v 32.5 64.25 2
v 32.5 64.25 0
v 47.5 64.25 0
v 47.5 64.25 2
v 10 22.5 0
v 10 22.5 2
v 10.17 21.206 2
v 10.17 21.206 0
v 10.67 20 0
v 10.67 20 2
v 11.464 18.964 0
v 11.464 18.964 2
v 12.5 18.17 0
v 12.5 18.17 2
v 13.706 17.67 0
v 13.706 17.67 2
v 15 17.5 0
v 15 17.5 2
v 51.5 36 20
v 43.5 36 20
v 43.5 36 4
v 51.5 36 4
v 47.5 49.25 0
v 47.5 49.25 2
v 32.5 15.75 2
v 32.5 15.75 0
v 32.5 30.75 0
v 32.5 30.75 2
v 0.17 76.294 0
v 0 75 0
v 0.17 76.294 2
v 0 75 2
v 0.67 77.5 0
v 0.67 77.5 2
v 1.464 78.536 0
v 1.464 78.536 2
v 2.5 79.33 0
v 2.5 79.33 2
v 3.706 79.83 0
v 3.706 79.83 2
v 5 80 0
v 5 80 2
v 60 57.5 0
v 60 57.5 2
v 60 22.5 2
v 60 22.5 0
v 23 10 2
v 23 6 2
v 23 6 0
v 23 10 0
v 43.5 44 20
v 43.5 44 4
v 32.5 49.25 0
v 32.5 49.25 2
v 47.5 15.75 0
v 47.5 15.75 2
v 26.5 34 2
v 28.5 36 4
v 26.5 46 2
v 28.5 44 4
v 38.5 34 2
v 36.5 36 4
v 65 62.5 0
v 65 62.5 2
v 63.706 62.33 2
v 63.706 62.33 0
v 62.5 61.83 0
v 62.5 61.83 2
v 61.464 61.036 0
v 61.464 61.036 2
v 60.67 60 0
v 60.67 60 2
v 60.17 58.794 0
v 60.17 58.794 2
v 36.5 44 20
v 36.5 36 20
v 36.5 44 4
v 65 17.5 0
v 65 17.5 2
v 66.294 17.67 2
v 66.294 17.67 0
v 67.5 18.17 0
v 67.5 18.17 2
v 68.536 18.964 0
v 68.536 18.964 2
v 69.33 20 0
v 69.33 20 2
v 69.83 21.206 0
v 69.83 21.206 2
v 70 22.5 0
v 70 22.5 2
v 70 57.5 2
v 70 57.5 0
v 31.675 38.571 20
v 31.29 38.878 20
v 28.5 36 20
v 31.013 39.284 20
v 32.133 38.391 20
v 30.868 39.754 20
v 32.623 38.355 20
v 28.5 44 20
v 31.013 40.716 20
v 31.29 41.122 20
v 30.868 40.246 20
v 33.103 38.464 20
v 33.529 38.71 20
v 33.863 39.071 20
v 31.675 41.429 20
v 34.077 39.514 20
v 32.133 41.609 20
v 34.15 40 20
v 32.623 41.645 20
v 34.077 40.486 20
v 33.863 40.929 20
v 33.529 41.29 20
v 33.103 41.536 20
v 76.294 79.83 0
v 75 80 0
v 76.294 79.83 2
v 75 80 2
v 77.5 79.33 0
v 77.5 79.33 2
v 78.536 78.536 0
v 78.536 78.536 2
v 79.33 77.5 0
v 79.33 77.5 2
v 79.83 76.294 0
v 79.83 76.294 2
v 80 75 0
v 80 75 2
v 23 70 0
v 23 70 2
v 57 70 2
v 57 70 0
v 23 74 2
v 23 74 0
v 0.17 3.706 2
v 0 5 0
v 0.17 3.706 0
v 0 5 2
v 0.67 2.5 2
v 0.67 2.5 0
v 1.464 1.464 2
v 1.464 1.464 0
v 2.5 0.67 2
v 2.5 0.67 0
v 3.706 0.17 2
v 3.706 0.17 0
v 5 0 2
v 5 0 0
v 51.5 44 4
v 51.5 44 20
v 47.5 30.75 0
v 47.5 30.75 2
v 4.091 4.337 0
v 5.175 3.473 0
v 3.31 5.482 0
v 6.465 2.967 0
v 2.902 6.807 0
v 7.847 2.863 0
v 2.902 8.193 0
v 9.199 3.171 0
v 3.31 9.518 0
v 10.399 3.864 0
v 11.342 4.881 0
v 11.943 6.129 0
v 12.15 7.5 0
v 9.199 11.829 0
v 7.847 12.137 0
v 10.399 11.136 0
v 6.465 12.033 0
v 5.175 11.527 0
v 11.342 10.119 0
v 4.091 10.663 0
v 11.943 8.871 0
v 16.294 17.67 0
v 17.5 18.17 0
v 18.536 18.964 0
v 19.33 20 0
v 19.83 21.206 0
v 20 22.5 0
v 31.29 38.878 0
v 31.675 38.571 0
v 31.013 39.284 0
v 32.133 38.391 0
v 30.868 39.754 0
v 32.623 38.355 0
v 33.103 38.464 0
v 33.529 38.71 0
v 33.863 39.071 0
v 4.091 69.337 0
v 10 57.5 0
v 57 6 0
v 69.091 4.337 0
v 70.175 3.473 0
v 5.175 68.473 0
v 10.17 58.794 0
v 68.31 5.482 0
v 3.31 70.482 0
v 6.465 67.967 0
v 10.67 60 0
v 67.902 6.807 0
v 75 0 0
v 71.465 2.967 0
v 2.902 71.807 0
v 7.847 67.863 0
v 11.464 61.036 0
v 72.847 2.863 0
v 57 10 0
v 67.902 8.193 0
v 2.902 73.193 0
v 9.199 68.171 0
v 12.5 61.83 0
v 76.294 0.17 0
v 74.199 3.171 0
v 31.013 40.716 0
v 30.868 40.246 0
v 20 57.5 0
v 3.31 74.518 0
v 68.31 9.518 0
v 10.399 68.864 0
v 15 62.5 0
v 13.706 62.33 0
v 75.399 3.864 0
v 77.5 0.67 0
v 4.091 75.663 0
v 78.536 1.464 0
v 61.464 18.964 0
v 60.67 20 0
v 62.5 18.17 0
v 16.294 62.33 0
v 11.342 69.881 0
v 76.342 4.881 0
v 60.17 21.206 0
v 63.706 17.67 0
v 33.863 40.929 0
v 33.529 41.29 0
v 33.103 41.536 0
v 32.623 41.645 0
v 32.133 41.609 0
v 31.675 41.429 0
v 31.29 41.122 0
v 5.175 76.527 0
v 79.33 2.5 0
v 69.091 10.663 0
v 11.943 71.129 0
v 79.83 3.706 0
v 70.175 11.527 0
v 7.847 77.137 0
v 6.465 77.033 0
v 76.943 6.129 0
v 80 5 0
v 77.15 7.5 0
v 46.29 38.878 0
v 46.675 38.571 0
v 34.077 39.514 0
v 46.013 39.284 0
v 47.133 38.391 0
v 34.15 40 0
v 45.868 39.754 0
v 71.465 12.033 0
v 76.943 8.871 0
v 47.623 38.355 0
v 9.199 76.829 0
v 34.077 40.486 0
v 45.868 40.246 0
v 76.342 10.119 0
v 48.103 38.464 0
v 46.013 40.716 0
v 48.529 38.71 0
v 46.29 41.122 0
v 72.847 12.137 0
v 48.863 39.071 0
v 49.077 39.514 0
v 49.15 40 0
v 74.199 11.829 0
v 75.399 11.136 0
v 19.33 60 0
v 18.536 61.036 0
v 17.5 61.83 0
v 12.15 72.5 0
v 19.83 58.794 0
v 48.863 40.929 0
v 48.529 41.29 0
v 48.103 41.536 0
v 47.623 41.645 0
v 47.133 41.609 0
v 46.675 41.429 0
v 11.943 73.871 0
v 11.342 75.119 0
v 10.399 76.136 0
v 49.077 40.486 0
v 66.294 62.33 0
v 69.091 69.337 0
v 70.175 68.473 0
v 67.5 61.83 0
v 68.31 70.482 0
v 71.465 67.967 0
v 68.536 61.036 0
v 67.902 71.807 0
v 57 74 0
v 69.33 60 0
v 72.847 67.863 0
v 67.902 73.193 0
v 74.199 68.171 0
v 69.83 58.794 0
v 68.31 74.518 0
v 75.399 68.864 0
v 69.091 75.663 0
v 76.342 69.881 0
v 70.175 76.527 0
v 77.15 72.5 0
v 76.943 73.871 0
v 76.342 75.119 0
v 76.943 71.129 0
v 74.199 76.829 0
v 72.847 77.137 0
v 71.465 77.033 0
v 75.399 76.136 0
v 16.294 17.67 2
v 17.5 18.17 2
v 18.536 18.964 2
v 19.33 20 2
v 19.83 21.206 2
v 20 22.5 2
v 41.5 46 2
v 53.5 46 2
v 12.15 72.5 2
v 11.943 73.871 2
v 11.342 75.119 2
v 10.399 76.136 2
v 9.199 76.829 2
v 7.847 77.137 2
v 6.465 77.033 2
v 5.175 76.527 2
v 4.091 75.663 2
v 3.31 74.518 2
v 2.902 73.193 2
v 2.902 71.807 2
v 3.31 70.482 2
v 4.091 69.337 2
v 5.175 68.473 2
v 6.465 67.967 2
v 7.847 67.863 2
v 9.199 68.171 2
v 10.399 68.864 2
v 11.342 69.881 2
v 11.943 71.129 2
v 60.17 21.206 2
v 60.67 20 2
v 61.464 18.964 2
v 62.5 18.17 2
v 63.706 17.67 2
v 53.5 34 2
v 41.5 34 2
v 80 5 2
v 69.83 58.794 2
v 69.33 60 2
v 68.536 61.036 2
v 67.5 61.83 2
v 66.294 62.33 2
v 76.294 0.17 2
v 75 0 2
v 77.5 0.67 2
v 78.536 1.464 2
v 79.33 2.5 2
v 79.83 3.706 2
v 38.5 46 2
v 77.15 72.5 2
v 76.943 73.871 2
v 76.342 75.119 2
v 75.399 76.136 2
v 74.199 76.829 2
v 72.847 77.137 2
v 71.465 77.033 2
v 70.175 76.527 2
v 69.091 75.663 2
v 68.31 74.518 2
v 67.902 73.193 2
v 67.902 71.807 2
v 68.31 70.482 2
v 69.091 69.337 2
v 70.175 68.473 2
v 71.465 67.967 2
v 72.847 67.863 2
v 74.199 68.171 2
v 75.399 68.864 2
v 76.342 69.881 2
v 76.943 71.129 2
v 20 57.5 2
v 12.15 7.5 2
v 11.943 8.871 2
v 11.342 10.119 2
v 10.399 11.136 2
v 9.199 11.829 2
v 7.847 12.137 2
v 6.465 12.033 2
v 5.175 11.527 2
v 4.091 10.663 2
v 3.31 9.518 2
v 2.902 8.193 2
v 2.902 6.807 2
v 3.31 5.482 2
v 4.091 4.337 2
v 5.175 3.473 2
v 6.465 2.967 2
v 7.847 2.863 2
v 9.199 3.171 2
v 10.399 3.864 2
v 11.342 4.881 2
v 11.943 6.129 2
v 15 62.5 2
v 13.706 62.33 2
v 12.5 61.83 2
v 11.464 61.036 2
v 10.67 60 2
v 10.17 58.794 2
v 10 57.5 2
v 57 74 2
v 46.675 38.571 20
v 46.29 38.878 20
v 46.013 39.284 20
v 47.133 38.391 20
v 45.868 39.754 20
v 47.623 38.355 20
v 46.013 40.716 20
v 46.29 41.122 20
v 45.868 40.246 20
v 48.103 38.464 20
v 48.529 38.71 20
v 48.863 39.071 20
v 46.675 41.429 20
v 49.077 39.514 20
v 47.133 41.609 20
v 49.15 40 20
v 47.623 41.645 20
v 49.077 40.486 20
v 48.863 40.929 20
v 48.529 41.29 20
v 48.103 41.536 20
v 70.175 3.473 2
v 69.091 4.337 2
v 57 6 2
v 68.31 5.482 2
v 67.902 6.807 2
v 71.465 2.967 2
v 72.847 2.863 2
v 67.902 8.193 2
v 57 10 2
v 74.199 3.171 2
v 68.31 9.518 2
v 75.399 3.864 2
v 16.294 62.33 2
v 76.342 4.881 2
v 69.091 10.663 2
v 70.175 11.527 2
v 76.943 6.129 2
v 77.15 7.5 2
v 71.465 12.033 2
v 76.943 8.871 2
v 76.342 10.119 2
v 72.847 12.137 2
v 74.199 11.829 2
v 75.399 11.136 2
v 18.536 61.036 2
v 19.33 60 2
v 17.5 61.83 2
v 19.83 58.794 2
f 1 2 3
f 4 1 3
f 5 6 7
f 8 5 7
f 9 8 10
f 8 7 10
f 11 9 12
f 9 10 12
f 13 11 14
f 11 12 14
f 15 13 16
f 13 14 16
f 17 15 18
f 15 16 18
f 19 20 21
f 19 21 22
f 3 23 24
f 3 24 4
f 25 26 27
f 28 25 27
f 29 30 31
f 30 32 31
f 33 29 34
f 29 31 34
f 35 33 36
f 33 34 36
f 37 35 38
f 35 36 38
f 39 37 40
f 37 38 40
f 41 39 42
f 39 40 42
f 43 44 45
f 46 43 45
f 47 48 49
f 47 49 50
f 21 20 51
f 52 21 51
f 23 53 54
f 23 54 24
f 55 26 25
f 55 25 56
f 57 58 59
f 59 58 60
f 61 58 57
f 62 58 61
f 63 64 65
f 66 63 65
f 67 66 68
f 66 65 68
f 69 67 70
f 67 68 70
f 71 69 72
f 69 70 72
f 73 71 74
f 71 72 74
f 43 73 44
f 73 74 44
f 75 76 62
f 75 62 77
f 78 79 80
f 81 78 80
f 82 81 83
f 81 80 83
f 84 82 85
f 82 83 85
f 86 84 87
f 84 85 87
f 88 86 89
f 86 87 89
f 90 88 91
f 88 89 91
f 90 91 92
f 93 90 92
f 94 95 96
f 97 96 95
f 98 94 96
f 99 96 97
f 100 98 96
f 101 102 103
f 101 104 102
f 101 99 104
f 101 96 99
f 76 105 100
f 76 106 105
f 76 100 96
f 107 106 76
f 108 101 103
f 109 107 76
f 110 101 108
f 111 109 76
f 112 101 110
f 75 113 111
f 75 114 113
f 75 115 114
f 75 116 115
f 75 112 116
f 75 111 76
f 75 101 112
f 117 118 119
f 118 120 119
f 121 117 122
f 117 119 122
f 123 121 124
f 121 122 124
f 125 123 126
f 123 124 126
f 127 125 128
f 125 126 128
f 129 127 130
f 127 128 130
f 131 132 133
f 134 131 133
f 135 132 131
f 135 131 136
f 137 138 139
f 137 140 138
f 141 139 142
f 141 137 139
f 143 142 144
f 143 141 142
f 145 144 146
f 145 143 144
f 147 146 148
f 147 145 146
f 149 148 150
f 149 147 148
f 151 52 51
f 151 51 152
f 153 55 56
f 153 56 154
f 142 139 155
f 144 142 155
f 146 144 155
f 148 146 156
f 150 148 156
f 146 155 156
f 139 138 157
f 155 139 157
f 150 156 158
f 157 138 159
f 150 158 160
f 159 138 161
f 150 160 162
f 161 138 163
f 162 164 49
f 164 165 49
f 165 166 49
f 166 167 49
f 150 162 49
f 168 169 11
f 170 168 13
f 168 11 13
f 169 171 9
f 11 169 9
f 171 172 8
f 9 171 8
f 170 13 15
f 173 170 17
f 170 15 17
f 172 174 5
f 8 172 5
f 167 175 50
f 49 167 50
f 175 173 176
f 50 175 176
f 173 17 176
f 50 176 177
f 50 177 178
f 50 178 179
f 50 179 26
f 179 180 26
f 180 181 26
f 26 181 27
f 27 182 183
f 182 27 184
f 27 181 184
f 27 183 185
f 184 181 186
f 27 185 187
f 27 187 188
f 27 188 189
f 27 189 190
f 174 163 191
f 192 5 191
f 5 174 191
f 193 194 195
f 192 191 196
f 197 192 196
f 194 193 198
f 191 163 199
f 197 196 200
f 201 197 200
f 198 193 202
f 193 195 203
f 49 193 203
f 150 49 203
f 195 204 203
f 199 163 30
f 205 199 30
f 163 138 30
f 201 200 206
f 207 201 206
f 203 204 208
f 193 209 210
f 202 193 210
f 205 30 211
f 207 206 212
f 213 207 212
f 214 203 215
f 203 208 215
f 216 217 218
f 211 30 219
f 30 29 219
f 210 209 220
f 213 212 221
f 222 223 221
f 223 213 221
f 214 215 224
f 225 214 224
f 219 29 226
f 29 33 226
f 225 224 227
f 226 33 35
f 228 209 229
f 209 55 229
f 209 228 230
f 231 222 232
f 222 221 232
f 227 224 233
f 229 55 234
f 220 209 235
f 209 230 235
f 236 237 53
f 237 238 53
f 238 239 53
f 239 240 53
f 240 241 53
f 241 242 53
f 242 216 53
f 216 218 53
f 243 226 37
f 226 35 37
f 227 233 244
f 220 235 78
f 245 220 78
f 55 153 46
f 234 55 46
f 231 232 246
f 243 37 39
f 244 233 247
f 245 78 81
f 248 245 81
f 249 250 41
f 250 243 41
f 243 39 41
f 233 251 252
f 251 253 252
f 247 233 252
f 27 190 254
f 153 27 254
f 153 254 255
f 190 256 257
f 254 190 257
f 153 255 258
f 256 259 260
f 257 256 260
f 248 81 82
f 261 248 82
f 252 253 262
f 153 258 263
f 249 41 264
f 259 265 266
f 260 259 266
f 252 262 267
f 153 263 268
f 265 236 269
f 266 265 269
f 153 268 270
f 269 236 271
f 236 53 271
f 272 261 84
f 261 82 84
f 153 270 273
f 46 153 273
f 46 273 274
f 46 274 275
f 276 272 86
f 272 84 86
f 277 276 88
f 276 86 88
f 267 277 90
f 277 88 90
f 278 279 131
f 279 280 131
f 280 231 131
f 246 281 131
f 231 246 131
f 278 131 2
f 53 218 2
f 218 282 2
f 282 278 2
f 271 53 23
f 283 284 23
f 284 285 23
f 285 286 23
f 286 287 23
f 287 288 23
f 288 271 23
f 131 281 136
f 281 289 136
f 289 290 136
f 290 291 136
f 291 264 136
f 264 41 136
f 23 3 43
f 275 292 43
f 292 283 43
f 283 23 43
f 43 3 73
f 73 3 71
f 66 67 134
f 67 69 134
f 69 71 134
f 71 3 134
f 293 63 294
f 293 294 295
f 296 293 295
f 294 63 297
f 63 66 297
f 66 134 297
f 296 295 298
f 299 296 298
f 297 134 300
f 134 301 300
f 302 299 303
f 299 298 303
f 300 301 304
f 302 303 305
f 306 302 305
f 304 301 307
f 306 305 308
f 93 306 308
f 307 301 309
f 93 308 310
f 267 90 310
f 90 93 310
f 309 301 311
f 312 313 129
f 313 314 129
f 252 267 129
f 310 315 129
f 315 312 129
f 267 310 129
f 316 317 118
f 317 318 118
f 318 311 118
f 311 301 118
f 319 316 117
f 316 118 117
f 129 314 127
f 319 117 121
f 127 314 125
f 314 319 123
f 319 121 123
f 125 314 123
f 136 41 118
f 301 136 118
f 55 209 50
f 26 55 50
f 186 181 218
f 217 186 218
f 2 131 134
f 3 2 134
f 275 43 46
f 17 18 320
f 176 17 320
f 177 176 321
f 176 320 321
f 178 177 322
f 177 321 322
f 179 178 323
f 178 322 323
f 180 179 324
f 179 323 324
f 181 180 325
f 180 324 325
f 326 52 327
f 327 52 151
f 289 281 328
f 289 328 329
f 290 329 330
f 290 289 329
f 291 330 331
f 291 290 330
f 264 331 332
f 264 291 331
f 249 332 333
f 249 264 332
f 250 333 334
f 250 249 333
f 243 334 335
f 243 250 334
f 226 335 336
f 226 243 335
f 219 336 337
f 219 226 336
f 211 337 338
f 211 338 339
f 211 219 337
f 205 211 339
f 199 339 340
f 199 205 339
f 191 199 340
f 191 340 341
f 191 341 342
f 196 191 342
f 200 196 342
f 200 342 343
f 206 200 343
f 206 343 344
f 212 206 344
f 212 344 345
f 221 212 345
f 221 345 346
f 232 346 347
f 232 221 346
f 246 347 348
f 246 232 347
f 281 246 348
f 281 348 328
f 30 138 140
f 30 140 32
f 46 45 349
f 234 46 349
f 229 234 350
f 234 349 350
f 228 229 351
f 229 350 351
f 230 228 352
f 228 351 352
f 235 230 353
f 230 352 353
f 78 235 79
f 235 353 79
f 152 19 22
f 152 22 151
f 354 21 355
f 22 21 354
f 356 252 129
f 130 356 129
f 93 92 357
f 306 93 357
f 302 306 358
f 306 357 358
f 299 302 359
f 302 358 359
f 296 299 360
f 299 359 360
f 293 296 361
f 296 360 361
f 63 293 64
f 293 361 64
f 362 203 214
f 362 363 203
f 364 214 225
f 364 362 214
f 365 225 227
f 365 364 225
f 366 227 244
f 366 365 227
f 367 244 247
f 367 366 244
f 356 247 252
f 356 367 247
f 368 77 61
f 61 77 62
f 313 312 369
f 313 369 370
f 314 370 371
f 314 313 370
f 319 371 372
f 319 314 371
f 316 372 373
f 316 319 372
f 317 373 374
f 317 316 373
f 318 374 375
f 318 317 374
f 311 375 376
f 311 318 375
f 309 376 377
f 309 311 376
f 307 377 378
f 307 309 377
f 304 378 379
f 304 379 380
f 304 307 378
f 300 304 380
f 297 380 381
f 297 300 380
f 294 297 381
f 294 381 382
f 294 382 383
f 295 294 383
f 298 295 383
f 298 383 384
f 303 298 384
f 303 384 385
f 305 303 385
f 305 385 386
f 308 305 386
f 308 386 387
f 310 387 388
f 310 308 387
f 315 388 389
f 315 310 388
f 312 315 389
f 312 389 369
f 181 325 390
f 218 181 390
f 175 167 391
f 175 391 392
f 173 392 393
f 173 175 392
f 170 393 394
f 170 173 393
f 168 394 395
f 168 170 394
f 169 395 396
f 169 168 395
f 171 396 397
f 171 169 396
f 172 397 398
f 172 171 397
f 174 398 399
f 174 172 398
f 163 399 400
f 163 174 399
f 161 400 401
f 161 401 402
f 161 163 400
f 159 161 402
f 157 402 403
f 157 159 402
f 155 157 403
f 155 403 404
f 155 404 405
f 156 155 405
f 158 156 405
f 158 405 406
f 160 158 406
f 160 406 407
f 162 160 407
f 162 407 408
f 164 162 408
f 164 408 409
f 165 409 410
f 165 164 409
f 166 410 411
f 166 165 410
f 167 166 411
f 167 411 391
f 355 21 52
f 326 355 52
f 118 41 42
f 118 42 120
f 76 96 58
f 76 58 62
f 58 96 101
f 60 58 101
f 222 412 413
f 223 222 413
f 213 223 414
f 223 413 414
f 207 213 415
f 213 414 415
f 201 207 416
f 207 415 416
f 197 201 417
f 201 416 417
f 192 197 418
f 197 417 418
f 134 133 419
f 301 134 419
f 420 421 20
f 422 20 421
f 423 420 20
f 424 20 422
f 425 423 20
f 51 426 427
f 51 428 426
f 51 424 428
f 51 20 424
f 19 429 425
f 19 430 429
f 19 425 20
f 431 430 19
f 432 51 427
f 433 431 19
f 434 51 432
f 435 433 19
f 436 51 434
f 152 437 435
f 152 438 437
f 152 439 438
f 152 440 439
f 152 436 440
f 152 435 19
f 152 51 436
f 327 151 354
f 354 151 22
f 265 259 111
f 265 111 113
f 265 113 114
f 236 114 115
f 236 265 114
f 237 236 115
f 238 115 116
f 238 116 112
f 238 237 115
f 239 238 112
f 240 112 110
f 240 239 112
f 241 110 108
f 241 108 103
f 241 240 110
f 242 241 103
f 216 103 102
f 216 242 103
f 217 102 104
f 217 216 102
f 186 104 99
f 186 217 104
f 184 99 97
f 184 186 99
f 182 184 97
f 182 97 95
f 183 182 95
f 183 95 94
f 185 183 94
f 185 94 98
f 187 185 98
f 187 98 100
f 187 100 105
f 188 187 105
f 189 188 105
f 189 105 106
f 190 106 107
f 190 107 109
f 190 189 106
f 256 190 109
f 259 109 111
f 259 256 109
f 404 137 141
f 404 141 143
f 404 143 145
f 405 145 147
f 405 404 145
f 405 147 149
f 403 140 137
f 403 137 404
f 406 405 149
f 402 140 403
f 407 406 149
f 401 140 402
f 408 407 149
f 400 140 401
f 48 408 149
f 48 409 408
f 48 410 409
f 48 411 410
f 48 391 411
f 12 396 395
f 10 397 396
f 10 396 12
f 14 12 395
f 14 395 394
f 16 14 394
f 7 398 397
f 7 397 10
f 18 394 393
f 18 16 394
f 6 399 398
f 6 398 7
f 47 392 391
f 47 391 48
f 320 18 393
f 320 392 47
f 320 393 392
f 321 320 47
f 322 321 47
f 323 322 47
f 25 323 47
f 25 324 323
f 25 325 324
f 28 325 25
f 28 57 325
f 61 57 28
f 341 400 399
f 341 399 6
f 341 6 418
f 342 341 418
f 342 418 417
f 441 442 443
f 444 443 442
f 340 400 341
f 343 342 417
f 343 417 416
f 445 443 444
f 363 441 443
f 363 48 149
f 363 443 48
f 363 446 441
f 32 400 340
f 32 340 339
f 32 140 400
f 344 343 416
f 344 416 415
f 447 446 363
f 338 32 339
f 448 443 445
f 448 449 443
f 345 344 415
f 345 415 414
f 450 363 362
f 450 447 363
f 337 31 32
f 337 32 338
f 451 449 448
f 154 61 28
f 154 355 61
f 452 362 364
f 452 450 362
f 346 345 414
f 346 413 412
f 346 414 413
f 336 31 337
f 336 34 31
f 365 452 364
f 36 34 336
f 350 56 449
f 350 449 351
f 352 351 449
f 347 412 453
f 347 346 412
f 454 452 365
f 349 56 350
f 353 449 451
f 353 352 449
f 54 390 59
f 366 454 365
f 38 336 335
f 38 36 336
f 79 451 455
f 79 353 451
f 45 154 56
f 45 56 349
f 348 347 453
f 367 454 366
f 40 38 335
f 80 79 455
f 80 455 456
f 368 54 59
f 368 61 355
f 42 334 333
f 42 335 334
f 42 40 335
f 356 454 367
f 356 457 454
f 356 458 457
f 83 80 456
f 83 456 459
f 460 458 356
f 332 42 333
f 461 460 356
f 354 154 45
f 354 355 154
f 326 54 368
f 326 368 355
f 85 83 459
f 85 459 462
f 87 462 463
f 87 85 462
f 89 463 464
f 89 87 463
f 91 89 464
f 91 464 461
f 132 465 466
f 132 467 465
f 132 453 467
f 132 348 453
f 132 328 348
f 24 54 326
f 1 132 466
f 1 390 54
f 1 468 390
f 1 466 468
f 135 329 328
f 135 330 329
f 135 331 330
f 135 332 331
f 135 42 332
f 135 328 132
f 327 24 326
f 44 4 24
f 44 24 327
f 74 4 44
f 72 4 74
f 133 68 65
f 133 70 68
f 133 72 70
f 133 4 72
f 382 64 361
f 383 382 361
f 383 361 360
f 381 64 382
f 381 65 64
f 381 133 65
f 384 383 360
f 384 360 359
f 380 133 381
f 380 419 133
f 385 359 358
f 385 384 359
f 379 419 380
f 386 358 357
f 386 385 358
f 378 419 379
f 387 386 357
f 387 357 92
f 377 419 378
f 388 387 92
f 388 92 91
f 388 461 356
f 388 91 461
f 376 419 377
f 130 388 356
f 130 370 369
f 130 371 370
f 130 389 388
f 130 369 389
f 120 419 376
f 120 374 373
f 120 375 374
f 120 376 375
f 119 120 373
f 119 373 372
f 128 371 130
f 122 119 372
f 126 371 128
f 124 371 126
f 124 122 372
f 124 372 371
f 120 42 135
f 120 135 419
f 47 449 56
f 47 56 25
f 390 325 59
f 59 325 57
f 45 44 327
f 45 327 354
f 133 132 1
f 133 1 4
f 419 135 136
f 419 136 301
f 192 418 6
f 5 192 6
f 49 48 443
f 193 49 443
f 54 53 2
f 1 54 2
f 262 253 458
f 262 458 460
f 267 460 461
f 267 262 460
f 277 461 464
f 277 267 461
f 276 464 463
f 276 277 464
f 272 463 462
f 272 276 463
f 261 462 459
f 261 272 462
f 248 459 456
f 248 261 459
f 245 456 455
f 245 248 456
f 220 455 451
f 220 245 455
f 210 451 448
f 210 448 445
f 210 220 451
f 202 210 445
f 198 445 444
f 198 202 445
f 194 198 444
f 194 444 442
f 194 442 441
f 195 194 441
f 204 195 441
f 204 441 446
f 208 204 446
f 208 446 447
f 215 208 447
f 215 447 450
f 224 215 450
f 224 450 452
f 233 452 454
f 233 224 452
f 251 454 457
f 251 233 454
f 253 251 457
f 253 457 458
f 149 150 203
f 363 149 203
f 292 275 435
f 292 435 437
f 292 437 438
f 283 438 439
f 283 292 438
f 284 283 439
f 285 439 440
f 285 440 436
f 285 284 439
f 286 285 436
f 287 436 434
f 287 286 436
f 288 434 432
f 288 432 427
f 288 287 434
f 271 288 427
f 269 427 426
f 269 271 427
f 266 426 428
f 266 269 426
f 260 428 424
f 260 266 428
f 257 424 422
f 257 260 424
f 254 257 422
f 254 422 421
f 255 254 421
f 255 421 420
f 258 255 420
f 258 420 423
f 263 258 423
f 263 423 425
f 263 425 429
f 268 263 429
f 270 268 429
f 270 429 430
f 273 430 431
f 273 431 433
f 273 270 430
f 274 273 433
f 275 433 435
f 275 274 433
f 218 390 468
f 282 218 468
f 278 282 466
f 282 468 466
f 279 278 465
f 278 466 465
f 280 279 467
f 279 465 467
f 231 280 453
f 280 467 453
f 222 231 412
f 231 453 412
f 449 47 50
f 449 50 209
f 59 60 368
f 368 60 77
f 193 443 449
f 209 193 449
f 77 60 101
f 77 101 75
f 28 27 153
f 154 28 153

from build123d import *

# Parameters (mm, degrees)
F0_W     = 8
F0_H     = 8
F0_R     = 1.65
F1_DEPTH = 20
F0_W_2   = 80
F0_H_2   = 80
F0_R_2   = 4.65
F0_W_3   = 15
F0_H_3   = 15
F2_DEPTH = 2
F3_R     = 5
F4_SIZE  = 2
F5_SIZE  = 2
F6_SIZE  = 2
F7_SIZE  = 2
F8_W     = 34
F8_H     = 4
F9_DEPTH = 25


with BuildPart() as f1:
    # F0 (on Top) → F1 (new body)
    with BuildSketch(Plane.XY):
        with Locations((32.5, 40)):
            Rectangle(F0_W, F0_H)
        with Locations((32.5, 40)):
            Circle(F0_R, mode=Mode.SUBTRACT)
    extrude(amount=F1_DEPTH)



with BuildPart() as f1b:
    # F0 (on Top) → F1, piece 2 (new body)
    with BuildSketch(Plane.XY):
        with Locations((47.5, 40)):
            Rectangle(F0_W, F0_H)
        with Locations((47.5, 40)):
            Circle(F0_R, mode=Mode.SUBTRACT)
    extrude(amount=F1_DEPTH)


with BuildPart() as f1_1:
    add(f1.part)

    add(f1b.part)  # F2 merges F1b
    # F0 (on Top) → F2 (join)
    with BuildSketch(Plane.XY):
        with Locations((40, 40)):
            Rectangle(F0_W_2, F0_H_2)
        with Locations((7.5, 7.5)):
            Circle(F0_R_2, mode=Mode.SUBTRACT)
        with Locations((72.5, 7.5)):
            Circle(F0_R_2, mode=Mode.SUBTRACT)
        with Locations((40, 23.25)):
            Rectangle(F0_W_3, F0_H_3, mode=Mode.SUBTRACT)
        with Locations((32.5, 40)):
            Rectangle(F0_W, F0_H, mode=Mode.SUBTRACT)
        with Locations((7.5, 72.5)):
            Circle(F0_R_2, mode=Mode.SUBTRACT)
        with Locations((47.5, 40)):
            Rectangle(F0_W, F0_H, mode=Mode.SUBTRACT)
        with Locations((40, 56.75)):
            Rectangle(F0_W_3, F0_H_3, mode=Mode.SUBTRACT)
        with Locations((72.5, 72.5)):
            Circle(F0_R_2, mode=Mode.SUBTRACT)
    extrude(amount=F2_DEPTH)

    # F3
    f3_edges = [f1_1.edges().sort_by_distance(p)[0] for p in [
        (0, 80, 1),
        (80, 80, 1),
        (80, 0, 1),
        (0, 0, 1),
    ]]
    fillet(f3_edges, radius=F3_R)

    # F4
    f4_edges = [f1_1.edges().sort_by_distance(p)[0] for p in [
        (32.5, 44, 2),
        (47.5, 44, 2),
    ]]
    chamfer(f4_edges, length=F4_SIZE)

    # F5
    f5_edges = [f1_1.edges().sort_by_distance(p)[0] for p in [
        (32.5, 36, 2),
        (47.5, 36, 2),
    ]]
    chamfer(f5_edges, length=F5_SIZE)

    # F6
    f6_edges = [f1_1.edges().sort_by_distance(p)[0] for p in [
        (28.5, 40, 2),
        (36.5, 40, 2),
    ]]
    chamfer(f6_edges, length=F6_SIZE)

    # F7
    f7_edges = [f1_1.edges().sort_by_distance(p)[0] for p in [
        (51.5, 40, 2),
        (43.5, 40, 2),
    ]]
    chamfer(f7_edges, length=F7_SIZE)

    # F8 (on face) → F9 (cut)
    with BuildSketch(Plane.XY.offset(2)):
        with BuildLine():
            Line((20, 22.5), (20, 57.5))
            ThreePointArc((20, 57.5), (18.5355339059, 61.0355339059), (15, 62.5))
            ThreePointArc((15, 62.5), (11.4644660941, 61.0355339059), (10, 57.5))
            Line((10, 57.5), (10, 22.5))
            ThreePointArc((10, 22.5), (11.4644660941, 18.9644660941), (15, 17.5))
            ThreePointArc((15, 17.5), (18.5355339059, 18.9644660941), (20, 22.5))
        make_face()
        with BuildLine():
            ThreePointArc((65, 62.5), (61.4644660941, 61.0355339059), (60, 57.5))
            Line((60, 57.5), (60, 22.5))
            ThreePointArc((60, 22.5), (61.4644660941, 18.9644660941), (65, 17.5))
            ThreePointArc((65, 17.5), (68.5355339059, 18.9644660941), (70, 22.5))
            Line((70, 22.5), (70, 57.5))
            ThreePointArc((70, 57.5), (68.5355339059, 61.0355339059), (65, 62.5))
        make_face()
        with Locations((40, 72)):
            Rectangle(F8_W, F8_H)
        with Locations((40, 8)):
            Rectangle(F8_W, F8_H)
    extrude(amount=-F9_DEPTH, mode=Mode.SUBTRACT)


solid = f1_1.part
